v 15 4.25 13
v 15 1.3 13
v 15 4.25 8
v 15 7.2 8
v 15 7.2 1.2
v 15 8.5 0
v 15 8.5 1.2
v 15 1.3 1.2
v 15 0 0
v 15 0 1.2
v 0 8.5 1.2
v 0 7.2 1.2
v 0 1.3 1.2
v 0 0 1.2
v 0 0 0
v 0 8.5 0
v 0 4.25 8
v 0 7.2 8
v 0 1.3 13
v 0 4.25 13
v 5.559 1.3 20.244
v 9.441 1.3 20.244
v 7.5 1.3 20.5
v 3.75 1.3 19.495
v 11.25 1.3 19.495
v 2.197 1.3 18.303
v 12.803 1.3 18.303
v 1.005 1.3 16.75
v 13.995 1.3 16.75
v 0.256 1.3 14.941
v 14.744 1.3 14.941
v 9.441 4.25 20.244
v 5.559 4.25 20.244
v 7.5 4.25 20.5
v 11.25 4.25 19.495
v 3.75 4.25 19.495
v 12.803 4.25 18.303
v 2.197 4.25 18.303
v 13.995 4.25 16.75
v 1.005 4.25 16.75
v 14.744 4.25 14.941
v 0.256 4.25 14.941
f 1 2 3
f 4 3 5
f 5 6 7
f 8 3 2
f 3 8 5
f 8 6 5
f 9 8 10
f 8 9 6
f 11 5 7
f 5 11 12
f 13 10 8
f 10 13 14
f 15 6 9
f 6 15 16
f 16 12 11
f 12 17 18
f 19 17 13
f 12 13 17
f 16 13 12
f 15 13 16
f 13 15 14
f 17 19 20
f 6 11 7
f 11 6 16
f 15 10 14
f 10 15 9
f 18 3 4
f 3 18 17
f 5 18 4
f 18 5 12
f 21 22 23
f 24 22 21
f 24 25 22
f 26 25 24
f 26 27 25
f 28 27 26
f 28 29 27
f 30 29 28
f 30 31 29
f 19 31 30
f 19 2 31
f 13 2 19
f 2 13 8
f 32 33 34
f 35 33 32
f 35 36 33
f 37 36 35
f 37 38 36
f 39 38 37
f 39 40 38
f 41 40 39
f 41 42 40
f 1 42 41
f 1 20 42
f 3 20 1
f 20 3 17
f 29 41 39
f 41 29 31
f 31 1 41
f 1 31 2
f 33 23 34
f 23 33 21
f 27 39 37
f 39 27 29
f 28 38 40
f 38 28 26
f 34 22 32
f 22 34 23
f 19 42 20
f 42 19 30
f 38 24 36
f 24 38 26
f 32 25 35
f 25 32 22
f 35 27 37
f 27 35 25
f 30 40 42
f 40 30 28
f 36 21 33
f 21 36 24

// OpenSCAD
L = 15;
W = 8.5;
H= 1.2;
X = 1.3;
cube([L,W,H]);


W1=W-2*X;
W2=W1/2;
R=L/2;


translate([0, X, 0]) cube([L,W1,8]);
translate([0, X, 0]) cube([L,W2,13]);
translate([R,W2+X,13]) rotate([90,0,0]) cylinder(W2,d=L);




//polygon([[0,0],[W,0], [W,20]]);
